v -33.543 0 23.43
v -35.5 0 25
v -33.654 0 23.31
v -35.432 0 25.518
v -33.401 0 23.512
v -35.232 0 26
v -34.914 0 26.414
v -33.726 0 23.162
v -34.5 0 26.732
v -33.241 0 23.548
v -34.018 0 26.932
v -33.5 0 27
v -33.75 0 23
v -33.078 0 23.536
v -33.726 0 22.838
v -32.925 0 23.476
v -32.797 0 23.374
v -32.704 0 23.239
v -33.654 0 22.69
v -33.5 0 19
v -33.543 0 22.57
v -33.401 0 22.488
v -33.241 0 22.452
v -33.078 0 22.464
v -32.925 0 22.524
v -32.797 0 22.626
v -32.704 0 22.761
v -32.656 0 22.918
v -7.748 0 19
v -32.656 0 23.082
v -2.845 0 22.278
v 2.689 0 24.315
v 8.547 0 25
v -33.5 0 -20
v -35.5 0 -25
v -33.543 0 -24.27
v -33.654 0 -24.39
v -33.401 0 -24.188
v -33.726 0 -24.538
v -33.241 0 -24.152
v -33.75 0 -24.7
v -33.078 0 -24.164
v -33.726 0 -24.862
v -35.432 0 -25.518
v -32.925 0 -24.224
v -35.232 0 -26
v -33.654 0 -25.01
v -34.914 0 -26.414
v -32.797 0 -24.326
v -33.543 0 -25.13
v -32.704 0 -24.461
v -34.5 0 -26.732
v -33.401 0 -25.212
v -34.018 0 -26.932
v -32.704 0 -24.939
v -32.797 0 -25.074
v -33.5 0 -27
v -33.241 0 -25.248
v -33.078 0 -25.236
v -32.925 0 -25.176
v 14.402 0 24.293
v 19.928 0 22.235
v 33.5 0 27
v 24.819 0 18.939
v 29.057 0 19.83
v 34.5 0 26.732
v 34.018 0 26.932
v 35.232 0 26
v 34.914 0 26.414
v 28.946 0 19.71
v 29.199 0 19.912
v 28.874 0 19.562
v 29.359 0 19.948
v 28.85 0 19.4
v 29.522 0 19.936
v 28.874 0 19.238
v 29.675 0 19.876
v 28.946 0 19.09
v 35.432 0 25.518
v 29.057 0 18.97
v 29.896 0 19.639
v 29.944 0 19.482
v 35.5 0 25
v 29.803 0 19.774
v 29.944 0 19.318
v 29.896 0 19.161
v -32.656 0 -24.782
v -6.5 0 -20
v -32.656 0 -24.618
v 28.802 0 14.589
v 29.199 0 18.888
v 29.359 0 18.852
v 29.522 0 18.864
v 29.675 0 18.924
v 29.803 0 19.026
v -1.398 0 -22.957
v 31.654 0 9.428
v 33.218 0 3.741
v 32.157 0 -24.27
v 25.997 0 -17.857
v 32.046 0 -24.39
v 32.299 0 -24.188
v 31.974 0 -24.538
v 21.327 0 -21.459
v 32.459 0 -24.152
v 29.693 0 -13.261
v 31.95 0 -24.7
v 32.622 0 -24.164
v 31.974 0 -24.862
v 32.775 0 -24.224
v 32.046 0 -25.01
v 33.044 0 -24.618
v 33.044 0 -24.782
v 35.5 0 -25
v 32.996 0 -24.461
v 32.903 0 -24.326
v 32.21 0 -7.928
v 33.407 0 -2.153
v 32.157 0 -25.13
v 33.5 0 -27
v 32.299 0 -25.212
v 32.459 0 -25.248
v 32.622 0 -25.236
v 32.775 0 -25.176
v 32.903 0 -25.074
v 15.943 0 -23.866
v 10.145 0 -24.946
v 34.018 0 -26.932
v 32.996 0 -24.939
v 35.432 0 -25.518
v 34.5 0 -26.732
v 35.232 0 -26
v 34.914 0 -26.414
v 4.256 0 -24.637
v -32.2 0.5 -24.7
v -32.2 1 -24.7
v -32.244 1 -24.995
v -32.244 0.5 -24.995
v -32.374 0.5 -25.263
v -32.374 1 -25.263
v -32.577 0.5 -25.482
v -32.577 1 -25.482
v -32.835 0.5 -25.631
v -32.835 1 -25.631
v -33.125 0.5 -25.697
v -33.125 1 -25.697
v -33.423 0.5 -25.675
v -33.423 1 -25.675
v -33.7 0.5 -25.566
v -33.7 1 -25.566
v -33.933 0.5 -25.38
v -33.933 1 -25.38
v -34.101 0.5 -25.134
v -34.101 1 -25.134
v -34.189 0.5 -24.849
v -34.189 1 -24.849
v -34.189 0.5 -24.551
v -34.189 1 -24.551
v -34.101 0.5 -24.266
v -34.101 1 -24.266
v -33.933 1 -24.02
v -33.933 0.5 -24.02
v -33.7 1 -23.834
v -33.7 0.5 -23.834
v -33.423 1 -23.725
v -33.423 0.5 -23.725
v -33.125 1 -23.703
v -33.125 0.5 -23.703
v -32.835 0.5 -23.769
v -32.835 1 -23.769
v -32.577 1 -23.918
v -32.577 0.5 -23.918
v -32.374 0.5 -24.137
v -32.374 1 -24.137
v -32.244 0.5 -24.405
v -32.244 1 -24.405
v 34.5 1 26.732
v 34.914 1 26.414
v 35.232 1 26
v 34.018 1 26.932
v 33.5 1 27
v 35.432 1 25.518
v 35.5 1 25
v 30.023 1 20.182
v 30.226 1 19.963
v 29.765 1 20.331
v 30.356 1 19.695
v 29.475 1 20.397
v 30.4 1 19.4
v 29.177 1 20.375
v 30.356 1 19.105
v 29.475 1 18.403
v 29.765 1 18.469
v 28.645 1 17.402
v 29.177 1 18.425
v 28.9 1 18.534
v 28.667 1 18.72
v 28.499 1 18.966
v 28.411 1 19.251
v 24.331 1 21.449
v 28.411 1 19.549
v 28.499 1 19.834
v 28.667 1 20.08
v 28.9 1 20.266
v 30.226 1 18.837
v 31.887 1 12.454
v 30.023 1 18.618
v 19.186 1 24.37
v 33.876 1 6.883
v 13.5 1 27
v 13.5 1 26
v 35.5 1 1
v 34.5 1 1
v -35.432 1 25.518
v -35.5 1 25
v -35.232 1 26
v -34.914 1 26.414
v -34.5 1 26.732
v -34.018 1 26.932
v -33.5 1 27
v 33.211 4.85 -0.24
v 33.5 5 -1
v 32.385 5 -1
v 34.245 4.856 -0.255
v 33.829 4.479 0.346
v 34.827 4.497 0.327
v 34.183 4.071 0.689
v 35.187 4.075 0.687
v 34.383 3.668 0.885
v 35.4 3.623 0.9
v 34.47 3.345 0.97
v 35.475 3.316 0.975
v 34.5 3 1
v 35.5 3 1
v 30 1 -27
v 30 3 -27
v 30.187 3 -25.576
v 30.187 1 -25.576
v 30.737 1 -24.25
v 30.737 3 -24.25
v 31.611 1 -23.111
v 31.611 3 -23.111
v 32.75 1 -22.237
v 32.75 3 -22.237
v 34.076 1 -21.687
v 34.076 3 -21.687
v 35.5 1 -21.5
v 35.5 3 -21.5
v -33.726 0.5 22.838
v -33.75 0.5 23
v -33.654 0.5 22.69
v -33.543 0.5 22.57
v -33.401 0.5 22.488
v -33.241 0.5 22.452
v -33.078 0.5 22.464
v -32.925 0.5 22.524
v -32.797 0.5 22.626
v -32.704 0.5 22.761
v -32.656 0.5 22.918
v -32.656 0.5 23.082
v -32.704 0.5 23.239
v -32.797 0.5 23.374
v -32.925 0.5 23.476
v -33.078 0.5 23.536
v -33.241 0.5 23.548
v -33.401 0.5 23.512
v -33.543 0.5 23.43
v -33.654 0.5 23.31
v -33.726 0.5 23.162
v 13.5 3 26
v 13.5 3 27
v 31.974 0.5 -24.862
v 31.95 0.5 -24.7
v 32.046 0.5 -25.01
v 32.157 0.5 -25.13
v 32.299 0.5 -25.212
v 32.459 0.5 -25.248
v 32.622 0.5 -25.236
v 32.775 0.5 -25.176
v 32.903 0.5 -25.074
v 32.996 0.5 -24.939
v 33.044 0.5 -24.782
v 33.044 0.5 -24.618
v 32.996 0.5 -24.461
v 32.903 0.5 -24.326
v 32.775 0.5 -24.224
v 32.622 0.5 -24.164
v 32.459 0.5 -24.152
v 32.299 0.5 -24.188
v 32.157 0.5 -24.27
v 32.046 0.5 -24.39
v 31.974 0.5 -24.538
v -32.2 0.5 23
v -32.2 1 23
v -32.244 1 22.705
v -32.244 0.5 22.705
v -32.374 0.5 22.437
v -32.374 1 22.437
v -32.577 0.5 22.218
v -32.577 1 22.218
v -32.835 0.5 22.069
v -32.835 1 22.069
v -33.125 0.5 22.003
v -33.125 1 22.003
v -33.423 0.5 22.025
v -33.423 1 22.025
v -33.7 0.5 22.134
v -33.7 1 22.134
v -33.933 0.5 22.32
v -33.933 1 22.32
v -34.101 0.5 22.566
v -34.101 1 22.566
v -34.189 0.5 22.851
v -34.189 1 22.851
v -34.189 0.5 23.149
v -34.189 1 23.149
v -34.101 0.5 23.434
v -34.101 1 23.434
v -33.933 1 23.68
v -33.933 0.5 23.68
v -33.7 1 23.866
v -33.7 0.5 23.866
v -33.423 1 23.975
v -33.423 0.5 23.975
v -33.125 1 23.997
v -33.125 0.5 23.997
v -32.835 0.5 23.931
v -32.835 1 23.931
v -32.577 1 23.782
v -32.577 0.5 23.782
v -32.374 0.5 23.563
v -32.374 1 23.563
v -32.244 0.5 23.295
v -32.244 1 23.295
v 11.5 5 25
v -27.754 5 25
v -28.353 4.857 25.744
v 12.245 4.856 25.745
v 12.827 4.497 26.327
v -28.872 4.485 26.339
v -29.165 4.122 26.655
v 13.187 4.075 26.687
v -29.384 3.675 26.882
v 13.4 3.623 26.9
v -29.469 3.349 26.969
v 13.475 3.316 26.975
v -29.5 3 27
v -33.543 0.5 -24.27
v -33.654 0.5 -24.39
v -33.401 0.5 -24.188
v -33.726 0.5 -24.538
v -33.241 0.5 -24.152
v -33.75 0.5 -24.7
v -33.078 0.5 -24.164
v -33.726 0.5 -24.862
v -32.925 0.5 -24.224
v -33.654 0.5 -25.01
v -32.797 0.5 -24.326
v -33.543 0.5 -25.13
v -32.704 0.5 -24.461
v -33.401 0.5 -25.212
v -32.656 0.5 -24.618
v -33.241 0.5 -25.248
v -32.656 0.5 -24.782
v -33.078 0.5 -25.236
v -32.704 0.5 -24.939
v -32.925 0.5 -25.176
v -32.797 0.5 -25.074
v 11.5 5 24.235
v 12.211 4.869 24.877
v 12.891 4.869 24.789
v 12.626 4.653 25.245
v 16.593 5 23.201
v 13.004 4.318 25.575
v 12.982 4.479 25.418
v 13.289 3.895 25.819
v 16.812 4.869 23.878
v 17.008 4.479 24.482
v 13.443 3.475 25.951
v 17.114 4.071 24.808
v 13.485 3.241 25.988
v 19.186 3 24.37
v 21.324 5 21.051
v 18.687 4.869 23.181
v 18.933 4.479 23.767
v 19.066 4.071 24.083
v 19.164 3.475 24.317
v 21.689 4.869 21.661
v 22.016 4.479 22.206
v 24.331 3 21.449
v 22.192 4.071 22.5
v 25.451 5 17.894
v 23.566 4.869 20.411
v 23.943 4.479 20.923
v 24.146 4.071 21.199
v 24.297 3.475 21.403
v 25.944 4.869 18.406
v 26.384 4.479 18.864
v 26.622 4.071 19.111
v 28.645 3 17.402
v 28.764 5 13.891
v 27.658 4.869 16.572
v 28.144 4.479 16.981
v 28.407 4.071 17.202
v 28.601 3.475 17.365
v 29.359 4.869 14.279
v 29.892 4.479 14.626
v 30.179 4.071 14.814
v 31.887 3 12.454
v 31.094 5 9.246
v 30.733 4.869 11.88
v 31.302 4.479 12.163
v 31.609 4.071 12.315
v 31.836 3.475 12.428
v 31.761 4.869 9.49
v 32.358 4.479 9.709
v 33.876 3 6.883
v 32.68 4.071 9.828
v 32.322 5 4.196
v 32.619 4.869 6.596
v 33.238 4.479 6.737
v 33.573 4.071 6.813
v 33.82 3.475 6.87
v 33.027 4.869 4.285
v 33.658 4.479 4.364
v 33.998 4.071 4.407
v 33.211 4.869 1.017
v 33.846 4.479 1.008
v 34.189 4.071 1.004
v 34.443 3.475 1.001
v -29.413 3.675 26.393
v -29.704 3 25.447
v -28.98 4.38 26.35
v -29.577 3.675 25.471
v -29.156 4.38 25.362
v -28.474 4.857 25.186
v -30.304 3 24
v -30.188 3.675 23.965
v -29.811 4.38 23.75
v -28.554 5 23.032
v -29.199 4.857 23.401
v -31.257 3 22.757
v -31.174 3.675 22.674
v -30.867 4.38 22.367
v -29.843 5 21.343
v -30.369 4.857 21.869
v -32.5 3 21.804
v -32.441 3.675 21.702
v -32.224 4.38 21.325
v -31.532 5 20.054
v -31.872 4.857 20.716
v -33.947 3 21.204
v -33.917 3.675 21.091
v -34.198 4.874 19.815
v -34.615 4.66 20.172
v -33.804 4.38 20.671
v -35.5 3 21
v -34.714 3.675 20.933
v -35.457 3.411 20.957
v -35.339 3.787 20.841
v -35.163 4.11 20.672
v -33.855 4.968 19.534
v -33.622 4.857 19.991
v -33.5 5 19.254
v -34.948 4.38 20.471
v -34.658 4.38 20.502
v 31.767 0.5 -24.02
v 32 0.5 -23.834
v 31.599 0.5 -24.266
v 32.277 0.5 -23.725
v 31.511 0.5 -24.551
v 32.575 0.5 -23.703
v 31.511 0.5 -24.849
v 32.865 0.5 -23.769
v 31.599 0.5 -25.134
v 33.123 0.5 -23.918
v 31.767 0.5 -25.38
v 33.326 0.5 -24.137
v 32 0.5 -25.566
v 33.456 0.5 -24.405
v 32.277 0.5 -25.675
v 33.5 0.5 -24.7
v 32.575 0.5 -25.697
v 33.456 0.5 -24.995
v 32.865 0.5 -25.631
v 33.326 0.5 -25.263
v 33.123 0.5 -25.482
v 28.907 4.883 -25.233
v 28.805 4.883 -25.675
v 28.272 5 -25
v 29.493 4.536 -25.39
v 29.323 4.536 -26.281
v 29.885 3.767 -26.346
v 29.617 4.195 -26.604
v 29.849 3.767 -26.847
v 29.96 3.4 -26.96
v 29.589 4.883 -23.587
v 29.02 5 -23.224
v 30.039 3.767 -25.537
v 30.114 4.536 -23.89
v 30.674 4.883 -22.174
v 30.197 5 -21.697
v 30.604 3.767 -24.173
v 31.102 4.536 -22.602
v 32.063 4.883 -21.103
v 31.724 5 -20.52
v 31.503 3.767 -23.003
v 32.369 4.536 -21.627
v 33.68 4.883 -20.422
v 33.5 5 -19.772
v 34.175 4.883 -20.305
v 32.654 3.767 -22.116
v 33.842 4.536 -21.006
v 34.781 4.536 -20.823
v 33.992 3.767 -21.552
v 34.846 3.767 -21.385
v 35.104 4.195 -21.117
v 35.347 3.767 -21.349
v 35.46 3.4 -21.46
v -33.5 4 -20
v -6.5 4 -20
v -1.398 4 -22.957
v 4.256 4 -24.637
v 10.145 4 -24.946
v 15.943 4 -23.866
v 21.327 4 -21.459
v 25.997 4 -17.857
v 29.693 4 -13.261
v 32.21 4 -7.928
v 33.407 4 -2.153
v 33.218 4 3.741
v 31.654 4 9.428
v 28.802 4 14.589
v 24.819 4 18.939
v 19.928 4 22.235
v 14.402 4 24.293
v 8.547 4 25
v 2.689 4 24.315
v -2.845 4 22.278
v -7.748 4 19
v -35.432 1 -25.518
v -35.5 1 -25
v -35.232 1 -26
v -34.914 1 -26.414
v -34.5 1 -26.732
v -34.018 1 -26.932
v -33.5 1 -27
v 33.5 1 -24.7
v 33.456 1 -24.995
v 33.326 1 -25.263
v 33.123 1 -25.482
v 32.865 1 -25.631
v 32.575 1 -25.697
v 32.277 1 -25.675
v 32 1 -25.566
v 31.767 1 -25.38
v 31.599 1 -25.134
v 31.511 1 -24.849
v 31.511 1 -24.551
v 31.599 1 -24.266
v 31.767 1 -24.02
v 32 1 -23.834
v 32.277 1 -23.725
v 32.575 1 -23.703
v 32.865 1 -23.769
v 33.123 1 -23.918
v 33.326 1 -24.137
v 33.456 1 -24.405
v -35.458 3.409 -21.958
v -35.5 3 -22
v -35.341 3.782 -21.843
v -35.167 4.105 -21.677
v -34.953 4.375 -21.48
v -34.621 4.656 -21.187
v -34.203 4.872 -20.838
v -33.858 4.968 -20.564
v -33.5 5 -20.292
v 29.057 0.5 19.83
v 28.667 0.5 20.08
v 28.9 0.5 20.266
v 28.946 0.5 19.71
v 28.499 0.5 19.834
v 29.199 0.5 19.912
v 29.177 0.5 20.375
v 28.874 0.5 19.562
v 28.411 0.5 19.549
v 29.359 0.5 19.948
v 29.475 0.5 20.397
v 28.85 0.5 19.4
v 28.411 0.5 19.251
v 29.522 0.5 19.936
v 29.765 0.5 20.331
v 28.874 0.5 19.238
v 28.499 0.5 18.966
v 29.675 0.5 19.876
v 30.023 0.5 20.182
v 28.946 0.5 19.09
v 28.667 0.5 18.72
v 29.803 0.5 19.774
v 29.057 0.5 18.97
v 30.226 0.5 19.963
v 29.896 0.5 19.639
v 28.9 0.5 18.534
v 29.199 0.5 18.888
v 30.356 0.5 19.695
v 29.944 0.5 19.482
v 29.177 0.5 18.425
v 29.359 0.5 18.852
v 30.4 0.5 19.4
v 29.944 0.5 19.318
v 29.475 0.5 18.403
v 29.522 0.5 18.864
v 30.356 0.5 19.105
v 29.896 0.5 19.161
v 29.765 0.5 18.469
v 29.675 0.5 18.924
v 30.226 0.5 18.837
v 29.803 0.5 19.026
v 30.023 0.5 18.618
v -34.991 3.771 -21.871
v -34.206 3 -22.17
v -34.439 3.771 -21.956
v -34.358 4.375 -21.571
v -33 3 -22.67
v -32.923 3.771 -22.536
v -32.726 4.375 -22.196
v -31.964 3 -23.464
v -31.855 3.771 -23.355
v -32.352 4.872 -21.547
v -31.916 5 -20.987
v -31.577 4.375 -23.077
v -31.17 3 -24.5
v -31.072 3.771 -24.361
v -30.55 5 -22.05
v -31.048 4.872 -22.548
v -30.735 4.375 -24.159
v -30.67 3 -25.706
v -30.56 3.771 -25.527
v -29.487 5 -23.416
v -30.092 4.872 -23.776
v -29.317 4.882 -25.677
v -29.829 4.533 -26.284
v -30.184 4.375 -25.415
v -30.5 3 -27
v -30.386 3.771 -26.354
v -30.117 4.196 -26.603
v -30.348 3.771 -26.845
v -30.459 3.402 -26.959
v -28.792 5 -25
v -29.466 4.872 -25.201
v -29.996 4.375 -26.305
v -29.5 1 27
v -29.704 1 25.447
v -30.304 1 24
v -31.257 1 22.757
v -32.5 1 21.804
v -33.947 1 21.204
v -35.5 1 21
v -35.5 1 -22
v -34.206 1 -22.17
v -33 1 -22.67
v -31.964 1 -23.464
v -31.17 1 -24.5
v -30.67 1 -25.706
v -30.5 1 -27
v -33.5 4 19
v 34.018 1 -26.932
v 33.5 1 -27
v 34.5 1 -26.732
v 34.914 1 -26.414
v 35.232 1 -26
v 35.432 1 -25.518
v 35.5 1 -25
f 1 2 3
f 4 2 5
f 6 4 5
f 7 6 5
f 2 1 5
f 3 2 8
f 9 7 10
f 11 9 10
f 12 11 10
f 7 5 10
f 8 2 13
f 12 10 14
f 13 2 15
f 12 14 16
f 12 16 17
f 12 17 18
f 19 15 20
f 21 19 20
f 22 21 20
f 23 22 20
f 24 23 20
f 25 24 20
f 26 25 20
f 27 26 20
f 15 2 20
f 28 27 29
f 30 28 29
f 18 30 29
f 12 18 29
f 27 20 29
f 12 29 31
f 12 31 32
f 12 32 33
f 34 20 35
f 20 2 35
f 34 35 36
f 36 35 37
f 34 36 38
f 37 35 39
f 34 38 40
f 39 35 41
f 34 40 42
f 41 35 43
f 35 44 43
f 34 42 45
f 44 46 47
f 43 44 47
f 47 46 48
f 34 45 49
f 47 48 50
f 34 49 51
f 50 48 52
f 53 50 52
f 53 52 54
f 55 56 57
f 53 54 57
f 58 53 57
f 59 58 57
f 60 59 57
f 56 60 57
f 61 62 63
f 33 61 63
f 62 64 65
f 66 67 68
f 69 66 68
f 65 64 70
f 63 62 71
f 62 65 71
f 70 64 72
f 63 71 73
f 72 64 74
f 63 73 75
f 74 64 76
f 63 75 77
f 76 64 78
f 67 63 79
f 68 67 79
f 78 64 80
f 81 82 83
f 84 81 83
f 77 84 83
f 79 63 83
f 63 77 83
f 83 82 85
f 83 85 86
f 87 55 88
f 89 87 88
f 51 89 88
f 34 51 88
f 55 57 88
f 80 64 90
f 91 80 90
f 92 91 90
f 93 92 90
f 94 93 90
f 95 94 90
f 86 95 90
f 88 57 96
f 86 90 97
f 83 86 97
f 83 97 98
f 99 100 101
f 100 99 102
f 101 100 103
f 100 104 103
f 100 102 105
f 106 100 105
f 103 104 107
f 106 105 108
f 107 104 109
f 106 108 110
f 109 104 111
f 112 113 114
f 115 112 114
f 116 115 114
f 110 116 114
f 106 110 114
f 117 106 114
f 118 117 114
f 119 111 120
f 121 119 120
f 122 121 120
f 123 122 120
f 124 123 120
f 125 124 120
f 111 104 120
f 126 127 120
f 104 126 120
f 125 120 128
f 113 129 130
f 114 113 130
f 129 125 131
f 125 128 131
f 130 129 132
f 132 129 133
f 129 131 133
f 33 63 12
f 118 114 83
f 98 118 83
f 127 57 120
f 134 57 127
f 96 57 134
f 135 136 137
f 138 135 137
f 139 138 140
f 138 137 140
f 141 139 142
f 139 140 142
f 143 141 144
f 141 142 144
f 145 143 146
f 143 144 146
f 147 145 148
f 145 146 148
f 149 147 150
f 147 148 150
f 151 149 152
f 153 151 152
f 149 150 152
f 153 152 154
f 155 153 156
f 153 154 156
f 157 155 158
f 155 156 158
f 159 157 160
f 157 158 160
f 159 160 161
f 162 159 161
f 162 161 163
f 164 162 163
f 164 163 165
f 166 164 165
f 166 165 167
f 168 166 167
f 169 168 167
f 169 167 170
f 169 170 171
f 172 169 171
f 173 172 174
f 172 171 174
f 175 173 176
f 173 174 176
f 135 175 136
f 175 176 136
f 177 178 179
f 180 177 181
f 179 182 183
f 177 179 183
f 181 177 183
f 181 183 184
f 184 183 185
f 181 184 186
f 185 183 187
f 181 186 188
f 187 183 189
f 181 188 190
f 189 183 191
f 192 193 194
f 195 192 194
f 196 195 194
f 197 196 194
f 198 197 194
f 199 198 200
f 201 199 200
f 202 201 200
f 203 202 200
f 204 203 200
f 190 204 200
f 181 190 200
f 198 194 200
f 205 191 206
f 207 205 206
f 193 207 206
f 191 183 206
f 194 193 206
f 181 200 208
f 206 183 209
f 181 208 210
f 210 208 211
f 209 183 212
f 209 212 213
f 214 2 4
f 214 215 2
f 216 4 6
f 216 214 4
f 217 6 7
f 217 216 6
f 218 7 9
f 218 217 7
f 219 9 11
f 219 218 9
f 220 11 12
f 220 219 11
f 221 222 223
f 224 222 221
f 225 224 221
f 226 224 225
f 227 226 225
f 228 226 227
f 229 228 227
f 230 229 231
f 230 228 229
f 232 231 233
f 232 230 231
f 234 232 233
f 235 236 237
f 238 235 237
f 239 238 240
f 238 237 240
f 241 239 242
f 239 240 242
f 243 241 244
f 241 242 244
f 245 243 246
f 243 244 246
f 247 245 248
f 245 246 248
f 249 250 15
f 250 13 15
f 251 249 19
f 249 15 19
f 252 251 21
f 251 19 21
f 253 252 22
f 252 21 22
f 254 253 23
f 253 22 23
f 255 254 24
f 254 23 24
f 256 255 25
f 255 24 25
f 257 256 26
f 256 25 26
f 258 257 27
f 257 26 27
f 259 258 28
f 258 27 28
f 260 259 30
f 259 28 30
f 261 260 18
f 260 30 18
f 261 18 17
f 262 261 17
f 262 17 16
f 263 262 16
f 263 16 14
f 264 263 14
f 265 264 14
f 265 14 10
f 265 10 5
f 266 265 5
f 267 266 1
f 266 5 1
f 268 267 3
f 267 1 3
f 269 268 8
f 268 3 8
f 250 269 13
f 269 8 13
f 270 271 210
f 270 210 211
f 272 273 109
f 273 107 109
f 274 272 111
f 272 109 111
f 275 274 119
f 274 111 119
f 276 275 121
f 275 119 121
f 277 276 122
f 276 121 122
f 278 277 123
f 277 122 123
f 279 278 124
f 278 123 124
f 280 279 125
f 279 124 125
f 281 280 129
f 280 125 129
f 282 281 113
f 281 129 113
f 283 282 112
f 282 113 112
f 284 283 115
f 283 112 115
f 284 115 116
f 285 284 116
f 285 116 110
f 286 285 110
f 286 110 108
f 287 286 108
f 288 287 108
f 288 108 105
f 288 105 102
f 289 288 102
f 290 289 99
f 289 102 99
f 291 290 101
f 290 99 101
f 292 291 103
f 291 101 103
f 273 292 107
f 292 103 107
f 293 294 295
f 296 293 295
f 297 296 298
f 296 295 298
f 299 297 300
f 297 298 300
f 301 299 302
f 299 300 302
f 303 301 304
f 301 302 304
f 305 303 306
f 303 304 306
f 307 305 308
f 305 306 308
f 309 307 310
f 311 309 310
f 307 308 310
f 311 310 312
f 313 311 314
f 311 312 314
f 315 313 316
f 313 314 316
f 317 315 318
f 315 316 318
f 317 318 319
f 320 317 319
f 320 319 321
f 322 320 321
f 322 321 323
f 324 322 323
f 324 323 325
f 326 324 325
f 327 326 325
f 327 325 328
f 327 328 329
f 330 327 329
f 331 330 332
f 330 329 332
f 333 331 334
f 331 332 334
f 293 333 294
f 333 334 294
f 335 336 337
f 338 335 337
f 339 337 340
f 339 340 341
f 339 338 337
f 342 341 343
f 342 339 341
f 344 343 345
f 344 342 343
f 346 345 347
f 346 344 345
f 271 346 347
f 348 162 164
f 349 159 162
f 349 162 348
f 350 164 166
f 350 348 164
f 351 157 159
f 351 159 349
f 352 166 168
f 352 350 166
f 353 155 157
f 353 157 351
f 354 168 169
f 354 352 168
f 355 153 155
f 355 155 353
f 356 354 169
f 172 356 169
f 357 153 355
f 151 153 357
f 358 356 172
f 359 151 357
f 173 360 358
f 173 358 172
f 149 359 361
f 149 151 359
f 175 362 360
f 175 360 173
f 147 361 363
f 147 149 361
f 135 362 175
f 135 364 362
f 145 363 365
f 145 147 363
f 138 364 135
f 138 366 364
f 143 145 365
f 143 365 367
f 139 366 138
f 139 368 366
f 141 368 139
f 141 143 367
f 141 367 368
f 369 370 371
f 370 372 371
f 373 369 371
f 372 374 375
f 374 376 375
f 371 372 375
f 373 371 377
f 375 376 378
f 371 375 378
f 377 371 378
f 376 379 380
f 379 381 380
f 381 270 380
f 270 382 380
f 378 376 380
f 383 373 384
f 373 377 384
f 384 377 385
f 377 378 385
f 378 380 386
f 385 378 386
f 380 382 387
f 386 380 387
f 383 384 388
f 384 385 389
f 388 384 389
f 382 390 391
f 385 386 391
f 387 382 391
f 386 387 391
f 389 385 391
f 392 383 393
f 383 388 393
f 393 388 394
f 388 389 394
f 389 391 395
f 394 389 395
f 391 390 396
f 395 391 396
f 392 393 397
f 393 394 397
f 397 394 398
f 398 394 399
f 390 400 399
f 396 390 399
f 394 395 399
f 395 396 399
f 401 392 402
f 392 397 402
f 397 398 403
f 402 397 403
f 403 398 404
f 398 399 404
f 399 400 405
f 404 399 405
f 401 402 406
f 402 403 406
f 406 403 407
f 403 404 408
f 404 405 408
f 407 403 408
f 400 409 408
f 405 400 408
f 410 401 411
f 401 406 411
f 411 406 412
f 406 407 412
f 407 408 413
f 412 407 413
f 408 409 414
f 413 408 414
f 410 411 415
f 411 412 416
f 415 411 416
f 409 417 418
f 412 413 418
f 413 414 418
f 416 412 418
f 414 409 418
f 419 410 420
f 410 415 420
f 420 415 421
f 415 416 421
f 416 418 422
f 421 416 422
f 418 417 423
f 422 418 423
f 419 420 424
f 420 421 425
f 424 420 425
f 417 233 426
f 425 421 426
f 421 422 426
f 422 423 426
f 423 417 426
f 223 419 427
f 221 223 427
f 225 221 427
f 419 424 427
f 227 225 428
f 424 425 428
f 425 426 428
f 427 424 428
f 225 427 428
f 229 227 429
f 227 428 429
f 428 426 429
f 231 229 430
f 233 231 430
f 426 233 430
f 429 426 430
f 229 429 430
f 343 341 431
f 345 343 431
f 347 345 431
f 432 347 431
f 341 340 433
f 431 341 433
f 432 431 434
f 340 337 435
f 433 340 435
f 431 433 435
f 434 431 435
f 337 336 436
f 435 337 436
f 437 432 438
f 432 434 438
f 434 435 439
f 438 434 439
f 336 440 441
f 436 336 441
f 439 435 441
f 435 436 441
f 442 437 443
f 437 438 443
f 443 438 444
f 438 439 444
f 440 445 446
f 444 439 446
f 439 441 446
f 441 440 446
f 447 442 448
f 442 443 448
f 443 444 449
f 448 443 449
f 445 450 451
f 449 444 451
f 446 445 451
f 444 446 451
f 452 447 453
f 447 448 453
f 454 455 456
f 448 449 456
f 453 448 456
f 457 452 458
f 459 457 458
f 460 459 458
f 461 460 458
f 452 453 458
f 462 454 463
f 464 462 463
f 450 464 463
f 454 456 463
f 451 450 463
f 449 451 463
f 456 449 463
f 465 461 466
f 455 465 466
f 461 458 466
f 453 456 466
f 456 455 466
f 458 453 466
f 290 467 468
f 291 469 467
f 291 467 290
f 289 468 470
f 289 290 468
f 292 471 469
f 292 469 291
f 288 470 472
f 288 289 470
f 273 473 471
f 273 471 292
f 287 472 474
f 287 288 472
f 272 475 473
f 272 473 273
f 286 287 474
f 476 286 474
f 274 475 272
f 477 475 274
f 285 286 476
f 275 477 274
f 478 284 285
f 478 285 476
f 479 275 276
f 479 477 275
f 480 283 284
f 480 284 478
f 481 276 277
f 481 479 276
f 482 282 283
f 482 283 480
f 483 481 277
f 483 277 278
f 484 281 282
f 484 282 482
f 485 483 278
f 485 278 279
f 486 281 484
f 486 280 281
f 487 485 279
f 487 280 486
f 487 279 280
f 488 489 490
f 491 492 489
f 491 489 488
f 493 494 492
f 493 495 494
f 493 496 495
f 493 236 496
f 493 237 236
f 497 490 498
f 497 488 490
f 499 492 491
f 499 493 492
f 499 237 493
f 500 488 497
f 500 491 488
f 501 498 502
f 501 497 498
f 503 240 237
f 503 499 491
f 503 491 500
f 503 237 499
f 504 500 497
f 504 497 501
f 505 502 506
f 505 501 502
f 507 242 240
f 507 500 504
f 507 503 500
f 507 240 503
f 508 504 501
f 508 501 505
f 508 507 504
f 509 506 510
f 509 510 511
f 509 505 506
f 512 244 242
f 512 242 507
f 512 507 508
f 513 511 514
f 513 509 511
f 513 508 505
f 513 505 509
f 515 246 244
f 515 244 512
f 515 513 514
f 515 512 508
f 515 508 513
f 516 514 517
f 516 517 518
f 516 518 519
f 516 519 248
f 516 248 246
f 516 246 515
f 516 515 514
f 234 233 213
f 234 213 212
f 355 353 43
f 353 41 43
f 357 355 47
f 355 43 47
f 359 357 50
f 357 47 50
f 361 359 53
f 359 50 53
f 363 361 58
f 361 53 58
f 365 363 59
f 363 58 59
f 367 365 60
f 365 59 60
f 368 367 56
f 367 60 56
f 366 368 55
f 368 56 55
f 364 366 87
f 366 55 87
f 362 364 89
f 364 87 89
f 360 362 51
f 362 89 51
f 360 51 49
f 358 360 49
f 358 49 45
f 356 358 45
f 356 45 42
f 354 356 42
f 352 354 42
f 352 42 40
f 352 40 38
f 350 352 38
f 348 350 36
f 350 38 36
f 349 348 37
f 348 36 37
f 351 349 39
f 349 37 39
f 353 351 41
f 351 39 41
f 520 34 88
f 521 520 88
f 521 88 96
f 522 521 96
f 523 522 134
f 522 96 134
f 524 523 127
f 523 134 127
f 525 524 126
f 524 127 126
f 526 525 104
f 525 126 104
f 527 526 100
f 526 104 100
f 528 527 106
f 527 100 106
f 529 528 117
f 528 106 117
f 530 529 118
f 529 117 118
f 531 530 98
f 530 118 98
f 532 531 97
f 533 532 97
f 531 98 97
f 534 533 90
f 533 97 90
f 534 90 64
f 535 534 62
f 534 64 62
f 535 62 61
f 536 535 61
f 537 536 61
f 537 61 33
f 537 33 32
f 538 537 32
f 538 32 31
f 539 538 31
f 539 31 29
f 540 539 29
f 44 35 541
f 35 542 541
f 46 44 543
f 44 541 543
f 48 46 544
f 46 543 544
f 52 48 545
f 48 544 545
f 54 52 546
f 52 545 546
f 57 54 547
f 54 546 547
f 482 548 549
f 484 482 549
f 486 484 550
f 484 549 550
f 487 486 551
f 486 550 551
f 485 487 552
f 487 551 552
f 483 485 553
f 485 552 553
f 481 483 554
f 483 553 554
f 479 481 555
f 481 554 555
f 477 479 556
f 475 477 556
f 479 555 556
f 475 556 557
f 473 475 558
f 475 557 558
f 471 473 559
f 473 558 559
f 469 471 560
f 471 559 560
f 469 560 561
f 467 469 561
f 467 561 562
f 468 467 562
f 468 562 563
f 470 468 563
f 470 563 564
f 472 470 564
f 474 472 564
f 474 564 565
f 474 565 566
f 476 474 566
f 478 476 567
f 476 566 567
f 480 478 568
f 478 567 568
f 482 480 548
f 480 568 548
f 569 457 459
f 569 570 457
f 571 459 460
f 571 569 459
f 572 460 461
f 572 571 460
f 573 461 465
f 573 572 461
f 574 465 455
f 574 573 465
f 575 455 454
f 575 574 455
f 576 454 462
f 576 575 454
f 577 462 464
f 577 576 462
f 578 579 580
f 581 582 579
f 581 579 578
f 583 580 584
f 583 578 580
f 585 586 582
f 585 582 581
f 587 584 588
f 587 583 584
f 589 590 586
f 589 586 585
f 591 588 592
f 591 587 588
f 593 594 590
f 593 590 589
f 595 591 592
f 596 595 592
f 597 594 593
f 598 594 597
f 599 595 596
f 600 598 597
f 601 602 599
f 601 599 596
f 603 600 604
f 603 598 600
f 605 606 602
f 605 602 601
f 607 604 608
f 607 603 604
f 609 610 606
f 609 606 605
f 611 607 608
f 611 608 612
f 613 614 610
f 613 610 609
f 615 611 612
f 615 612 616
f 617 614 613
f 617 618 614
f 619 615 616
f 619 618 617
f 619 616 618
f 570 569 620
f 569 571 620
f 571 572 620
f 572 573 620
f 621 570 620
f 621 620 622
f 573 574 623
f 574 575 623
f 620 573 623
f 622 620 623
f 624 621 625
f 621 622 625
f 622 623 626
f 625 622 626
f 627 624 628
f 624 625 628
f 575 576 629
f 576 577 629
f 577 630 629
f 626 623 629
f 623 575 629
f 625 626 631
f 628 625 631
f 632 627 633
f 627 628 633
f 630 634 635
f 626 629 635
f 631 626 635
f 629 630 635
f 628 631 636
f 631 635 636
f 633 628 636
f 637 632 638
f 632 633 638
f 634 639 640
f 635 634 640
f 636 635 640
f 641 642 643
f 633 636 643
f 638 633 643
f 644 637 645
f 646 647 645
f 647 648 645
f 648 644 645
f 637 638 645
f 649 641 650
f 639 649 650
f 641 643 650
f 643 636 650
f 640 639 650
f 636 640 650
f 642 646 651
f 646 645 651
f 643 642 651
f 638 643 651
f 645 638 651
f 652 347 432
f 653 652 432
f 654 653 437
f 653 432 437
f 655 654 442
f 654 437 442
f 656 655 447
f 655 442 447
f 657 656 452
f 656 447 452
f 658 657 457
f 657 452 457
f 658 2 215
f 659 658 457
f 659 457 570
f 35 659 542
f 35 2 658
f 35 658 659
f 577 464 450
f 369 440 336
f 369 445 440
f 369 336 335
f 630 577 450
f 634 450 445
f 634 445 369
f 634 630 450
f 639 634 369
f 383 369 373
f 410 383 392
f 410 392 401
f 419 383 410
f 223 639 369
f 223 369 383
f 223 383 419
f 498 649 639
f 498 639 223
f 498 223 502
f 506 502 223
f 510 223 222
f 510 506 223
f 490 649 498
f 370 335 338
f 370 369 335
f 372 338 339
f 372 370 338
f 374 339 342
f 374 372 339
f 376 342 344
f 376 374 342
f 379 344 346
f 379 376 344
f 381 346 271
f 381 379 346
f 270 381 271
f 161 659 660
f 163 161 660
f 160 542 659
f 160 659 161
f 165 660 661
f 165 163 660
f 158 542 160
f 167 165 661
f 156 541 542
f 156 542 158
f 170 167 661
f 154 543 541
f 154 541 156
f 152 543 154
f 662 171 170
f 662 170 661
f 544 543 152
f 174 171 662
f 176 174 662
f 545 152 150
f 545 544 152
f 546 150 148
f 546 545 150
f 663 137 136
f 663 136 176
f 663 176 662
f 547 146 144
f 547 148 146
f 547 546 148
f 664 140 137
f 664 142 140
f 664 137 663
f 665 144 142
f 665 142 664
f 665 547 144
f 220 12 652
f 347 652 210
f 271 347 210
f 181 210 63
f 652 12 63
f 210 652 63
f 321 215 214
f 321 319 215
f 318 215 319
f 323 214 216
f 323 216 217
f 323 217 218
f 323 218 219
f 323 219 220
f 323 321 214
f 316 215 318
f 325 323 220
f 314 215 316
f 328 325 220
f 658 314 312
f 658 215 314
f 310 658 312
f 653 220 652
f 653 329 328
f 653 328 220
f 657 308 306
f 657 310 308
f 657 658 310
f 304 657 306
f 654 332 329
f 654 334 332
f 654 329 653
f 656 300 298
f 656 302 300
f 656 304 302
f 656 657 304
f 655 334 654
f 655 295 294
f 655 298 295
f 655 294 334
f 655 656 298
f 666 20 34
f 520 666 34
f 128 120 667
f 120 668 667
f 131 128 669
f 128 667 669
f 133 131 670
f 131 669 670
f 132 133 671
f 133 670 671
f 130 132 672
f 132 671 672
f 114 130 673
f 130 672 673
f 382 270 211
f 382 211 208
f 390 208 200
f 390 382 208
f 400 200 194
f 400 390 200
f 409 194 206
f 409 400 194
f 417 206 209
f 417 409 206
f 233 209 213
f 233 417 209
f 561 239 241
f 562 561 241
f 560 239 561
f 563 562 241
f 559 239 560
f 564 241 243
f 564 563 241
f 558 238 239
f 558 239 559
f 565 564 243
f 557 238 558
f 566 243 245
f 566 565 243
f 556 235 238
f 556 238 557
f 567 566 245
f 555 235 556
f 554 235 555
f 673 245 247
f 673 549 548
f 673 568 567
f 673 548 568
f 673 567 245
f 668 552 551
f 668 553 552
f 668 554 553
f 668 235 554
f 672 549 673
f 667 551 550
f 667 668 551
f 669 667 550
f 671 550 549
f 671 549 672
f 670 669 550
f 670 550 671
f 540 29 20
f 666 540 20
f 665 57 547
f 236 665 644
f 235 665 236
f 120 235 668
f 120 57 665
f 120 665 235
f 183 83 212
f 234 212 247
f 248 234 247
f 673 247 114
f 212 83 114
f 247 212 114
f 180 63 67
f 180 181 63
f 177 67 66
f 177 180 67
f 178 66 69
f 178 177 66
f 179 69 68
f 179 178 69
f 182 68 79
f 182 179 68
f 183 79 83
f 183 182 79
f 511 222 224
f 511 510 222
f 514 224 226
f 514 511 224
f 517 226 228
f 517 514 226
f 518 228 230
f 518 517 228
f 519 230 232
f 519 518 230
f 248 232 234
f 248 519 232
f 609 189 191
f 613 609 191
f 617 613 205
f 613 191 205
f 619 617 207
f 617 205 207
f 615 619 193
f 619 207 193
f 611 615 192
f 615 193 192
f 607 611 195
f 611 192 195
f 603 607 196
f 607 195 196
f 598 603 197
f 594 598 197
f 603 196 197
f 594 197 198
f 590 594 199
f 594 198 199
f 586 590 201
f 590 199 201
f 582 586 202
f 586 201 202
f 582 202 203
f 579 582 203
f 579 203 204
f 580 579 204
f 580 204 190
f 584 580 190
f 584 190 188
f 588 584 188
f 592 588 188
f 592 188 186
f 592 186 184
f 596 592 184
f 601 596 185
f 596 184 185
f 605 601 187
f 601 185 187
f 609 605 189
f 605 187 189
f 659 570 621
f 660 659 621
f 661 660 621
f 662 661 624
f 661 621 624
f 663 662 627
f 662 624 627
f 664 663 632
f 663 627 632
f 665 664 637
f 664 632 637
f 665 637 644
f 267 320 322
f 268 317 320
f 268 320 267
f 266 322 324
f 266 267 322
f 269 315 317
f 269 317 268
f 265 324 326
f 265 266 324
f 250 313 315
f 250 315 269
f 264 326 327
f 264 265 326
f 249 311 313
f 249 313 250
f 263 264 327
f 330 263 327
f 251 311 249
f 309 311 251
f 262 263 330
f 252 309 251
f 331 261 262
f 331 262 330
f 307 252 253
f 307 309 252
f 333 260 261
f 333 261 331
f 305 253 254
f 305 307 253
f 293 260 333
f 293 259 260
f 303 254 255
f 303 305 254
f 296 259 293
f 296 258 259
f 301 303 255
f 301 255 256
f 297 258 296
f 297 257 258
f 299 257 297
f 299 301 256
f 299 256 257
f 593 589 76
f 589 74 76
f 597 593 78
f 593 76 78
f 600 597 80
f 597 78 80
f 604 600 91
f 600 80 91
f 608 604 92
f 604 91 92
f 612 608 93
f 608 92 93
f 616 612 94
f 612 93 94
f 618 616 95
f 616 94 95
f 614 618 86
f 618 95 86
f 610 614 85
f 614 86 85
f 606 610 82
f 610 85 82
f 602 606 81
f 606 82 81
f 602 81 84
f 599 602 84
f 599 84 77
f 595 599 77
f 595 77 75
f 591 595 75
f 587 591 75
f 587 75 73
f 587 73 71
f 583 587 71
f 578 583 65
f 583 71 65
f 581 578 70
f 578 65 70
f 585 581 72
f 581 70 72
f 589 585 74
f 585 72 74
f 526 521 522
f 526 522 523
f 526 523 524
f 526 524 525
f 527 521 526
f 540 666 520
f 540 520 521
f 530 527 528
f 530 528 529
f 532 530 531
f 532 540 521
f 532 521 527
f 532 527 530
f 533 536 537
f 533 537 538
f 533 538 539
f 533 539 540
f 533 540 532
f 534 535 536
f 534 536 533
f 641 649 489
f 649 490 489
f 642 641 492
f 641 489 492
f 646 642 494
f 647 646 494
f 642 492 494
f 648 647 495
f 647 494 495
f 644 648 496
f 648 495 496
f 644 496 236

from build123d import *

# Parameters (mm, degrees)
SKETCH1_W                         = 71
SKETCH1_H                         = 54
BOSS_EXTRUDE1_DEPTH               = 5
M1_4X0_3_TAPPED_HOLE1_D           = 1.1
M1_4X0_3_TAPPED_HOLE1_CSINK_D     = 1.45
M1_4X0_3_TAPPED_HOLE1_CSINK_ANGLE = 90
CUT_EXTRUDE1_DEPTH                = 4
SKETCH5_R                         = 6
SKETCH5_R_2                       = 5
SKETCH5_R_3                       = 5.5
CUT_EXTRUDE2_DEPTH                = 4
FILLET1_R                         = 2
FILLET2_R                         = 2
SKETCH6_R                         = 1
CUT_EXTRUDE3_DEPTH                = 0.5


with BuildPart() as part:
    # Sketch1 → Boss-Extrude1 (new body)
    with BuildSketch(Plane(origin=(0, 0, 0), x_dir=(1, 0, 0), z_dir=(0, 1, 0))):
        Rectangle(SKETCH1_W, SKETCH1_H)
    extrude(amount=BOSS_EXTRUDE1_DEPTH)

    # M1.4x0.3 Tapped Hole1 (through all)
    with Locations(Plane(origin=(0, 5, 0), x_dir=(1, 0, 0), z_dir=(0, 1, 0))):
        with Locations((-33.2, 24.7), (32.5, 24.7), (-33.2, -23), (29.4, -19.4)):
            CounterSinkHole(M1_4X0_3_TAPPED_HOLE1_D / 2, M1_4X0_3_TAPPED_HOLE1_CSINK_D / 2, counter_sink_angle=M1_4X0_3_TAPPED_HOLE1_CSINK_ANGLE)

    # Sketch4 → Cut-Extrude1 (cut)
    with BuildSketch(Plane.XZ):
        with BuildLine():
            Line((-7.748076809, 19), (-33.5, 19))
            Line((-33.5, 19), (-33.5, -20))
            Line((-33.5, -20), (-6.5, -20))
            ThreePointArc((-6.5, -20), (33.487208249, 0.799639875), (-7.748076809, 19))
        make_face()
    extrude(amount=-CUT_EXTRUDE1_DEPTH, mode=Mode.SUBTRACT)

    # Sketch5 → Cut-Extrude2 (cut)
    with BuildSketch(Plane(origin=(0, 5, 0), x_dir=(1, 0, 0), z_dir=(0, 1, 0))):
        with Locations((-35.5, -27)):
            Circle(SKETCH5_R)
        with Locations((-35.5, 27)):
            Circle(SKETCH5_R_2)
        with Locations((35.5, 27)):
            Circle(SKETCH5_R_3)
        with BuildLine():
            Line((34.5, -1), (35.5, -1))
            Line((35.5, -1), (35.5, -27))
            Line((35.5, -27), (13.5, -27))
            Line((13.5, -27), (13.5, -26))
            ThreePointArc((13.5, -26), (28.644692027, -17.401541303), (34.5, -1))
        make_face()
    extrude(amount=-CUT_EXTRUDE2_DEPTH, mode=Mode.SUBTRACT)

    # Fillet1
    fillet1_edges = [part.edges().sort_by_distance(p)[0] for p in [
        (35.5, 0.5, 27),
        (-35.5, 0.5, 27),
        (-35.5, 0.5, -27),
        (35.5, 0.5, -27),
    ]]
    fillet(fillet1_edges, radius=FILLET1_R)

    # Fillet2
    fillet2_edges = [part.edges().sort_by_distance(p)[0] for p in [
        (35.5, 5, -10.25),
        (-0.25, 5, -27),
        (-35.5, 5, -0.5),
        (-8, 5, 27),
        (28.644692027, 5, 17.401541303),
        (13.5, 5, 26.5),
        (35, 5, 1),
        (31.610912703, 5, -23.110912703),
        (-31.964466094, 5, -23.464466094),
        (-31.257359313, 5, 22.757359313),
    ]]
    fillet(fillet2_edges, radius=FILLET2_R)

    # Sketch6 → Cut-Extrude3 (cut)
    with BuildSketch(Plane(origin=(0, 1, 0), x_dir=(1, 0, 0), z_dir=(0, 1, 0))):
        with Locations((-33.2, 24.7)):
            Circle(SKETCH6_R)
        with Locations((32.5, 24.7)):
            Circle(SKETCH6_R)
        with Locations((29.4, -19.4)):
            Circle(SKETCH6_R)
        with Locations((-33.2, -23)):
            Circle(SKETCH6_R)
    extrude(amount=-CUT_EXTRUDE3_DEPTH, mode=Mode.SUBTRACT)


solid = part.part
